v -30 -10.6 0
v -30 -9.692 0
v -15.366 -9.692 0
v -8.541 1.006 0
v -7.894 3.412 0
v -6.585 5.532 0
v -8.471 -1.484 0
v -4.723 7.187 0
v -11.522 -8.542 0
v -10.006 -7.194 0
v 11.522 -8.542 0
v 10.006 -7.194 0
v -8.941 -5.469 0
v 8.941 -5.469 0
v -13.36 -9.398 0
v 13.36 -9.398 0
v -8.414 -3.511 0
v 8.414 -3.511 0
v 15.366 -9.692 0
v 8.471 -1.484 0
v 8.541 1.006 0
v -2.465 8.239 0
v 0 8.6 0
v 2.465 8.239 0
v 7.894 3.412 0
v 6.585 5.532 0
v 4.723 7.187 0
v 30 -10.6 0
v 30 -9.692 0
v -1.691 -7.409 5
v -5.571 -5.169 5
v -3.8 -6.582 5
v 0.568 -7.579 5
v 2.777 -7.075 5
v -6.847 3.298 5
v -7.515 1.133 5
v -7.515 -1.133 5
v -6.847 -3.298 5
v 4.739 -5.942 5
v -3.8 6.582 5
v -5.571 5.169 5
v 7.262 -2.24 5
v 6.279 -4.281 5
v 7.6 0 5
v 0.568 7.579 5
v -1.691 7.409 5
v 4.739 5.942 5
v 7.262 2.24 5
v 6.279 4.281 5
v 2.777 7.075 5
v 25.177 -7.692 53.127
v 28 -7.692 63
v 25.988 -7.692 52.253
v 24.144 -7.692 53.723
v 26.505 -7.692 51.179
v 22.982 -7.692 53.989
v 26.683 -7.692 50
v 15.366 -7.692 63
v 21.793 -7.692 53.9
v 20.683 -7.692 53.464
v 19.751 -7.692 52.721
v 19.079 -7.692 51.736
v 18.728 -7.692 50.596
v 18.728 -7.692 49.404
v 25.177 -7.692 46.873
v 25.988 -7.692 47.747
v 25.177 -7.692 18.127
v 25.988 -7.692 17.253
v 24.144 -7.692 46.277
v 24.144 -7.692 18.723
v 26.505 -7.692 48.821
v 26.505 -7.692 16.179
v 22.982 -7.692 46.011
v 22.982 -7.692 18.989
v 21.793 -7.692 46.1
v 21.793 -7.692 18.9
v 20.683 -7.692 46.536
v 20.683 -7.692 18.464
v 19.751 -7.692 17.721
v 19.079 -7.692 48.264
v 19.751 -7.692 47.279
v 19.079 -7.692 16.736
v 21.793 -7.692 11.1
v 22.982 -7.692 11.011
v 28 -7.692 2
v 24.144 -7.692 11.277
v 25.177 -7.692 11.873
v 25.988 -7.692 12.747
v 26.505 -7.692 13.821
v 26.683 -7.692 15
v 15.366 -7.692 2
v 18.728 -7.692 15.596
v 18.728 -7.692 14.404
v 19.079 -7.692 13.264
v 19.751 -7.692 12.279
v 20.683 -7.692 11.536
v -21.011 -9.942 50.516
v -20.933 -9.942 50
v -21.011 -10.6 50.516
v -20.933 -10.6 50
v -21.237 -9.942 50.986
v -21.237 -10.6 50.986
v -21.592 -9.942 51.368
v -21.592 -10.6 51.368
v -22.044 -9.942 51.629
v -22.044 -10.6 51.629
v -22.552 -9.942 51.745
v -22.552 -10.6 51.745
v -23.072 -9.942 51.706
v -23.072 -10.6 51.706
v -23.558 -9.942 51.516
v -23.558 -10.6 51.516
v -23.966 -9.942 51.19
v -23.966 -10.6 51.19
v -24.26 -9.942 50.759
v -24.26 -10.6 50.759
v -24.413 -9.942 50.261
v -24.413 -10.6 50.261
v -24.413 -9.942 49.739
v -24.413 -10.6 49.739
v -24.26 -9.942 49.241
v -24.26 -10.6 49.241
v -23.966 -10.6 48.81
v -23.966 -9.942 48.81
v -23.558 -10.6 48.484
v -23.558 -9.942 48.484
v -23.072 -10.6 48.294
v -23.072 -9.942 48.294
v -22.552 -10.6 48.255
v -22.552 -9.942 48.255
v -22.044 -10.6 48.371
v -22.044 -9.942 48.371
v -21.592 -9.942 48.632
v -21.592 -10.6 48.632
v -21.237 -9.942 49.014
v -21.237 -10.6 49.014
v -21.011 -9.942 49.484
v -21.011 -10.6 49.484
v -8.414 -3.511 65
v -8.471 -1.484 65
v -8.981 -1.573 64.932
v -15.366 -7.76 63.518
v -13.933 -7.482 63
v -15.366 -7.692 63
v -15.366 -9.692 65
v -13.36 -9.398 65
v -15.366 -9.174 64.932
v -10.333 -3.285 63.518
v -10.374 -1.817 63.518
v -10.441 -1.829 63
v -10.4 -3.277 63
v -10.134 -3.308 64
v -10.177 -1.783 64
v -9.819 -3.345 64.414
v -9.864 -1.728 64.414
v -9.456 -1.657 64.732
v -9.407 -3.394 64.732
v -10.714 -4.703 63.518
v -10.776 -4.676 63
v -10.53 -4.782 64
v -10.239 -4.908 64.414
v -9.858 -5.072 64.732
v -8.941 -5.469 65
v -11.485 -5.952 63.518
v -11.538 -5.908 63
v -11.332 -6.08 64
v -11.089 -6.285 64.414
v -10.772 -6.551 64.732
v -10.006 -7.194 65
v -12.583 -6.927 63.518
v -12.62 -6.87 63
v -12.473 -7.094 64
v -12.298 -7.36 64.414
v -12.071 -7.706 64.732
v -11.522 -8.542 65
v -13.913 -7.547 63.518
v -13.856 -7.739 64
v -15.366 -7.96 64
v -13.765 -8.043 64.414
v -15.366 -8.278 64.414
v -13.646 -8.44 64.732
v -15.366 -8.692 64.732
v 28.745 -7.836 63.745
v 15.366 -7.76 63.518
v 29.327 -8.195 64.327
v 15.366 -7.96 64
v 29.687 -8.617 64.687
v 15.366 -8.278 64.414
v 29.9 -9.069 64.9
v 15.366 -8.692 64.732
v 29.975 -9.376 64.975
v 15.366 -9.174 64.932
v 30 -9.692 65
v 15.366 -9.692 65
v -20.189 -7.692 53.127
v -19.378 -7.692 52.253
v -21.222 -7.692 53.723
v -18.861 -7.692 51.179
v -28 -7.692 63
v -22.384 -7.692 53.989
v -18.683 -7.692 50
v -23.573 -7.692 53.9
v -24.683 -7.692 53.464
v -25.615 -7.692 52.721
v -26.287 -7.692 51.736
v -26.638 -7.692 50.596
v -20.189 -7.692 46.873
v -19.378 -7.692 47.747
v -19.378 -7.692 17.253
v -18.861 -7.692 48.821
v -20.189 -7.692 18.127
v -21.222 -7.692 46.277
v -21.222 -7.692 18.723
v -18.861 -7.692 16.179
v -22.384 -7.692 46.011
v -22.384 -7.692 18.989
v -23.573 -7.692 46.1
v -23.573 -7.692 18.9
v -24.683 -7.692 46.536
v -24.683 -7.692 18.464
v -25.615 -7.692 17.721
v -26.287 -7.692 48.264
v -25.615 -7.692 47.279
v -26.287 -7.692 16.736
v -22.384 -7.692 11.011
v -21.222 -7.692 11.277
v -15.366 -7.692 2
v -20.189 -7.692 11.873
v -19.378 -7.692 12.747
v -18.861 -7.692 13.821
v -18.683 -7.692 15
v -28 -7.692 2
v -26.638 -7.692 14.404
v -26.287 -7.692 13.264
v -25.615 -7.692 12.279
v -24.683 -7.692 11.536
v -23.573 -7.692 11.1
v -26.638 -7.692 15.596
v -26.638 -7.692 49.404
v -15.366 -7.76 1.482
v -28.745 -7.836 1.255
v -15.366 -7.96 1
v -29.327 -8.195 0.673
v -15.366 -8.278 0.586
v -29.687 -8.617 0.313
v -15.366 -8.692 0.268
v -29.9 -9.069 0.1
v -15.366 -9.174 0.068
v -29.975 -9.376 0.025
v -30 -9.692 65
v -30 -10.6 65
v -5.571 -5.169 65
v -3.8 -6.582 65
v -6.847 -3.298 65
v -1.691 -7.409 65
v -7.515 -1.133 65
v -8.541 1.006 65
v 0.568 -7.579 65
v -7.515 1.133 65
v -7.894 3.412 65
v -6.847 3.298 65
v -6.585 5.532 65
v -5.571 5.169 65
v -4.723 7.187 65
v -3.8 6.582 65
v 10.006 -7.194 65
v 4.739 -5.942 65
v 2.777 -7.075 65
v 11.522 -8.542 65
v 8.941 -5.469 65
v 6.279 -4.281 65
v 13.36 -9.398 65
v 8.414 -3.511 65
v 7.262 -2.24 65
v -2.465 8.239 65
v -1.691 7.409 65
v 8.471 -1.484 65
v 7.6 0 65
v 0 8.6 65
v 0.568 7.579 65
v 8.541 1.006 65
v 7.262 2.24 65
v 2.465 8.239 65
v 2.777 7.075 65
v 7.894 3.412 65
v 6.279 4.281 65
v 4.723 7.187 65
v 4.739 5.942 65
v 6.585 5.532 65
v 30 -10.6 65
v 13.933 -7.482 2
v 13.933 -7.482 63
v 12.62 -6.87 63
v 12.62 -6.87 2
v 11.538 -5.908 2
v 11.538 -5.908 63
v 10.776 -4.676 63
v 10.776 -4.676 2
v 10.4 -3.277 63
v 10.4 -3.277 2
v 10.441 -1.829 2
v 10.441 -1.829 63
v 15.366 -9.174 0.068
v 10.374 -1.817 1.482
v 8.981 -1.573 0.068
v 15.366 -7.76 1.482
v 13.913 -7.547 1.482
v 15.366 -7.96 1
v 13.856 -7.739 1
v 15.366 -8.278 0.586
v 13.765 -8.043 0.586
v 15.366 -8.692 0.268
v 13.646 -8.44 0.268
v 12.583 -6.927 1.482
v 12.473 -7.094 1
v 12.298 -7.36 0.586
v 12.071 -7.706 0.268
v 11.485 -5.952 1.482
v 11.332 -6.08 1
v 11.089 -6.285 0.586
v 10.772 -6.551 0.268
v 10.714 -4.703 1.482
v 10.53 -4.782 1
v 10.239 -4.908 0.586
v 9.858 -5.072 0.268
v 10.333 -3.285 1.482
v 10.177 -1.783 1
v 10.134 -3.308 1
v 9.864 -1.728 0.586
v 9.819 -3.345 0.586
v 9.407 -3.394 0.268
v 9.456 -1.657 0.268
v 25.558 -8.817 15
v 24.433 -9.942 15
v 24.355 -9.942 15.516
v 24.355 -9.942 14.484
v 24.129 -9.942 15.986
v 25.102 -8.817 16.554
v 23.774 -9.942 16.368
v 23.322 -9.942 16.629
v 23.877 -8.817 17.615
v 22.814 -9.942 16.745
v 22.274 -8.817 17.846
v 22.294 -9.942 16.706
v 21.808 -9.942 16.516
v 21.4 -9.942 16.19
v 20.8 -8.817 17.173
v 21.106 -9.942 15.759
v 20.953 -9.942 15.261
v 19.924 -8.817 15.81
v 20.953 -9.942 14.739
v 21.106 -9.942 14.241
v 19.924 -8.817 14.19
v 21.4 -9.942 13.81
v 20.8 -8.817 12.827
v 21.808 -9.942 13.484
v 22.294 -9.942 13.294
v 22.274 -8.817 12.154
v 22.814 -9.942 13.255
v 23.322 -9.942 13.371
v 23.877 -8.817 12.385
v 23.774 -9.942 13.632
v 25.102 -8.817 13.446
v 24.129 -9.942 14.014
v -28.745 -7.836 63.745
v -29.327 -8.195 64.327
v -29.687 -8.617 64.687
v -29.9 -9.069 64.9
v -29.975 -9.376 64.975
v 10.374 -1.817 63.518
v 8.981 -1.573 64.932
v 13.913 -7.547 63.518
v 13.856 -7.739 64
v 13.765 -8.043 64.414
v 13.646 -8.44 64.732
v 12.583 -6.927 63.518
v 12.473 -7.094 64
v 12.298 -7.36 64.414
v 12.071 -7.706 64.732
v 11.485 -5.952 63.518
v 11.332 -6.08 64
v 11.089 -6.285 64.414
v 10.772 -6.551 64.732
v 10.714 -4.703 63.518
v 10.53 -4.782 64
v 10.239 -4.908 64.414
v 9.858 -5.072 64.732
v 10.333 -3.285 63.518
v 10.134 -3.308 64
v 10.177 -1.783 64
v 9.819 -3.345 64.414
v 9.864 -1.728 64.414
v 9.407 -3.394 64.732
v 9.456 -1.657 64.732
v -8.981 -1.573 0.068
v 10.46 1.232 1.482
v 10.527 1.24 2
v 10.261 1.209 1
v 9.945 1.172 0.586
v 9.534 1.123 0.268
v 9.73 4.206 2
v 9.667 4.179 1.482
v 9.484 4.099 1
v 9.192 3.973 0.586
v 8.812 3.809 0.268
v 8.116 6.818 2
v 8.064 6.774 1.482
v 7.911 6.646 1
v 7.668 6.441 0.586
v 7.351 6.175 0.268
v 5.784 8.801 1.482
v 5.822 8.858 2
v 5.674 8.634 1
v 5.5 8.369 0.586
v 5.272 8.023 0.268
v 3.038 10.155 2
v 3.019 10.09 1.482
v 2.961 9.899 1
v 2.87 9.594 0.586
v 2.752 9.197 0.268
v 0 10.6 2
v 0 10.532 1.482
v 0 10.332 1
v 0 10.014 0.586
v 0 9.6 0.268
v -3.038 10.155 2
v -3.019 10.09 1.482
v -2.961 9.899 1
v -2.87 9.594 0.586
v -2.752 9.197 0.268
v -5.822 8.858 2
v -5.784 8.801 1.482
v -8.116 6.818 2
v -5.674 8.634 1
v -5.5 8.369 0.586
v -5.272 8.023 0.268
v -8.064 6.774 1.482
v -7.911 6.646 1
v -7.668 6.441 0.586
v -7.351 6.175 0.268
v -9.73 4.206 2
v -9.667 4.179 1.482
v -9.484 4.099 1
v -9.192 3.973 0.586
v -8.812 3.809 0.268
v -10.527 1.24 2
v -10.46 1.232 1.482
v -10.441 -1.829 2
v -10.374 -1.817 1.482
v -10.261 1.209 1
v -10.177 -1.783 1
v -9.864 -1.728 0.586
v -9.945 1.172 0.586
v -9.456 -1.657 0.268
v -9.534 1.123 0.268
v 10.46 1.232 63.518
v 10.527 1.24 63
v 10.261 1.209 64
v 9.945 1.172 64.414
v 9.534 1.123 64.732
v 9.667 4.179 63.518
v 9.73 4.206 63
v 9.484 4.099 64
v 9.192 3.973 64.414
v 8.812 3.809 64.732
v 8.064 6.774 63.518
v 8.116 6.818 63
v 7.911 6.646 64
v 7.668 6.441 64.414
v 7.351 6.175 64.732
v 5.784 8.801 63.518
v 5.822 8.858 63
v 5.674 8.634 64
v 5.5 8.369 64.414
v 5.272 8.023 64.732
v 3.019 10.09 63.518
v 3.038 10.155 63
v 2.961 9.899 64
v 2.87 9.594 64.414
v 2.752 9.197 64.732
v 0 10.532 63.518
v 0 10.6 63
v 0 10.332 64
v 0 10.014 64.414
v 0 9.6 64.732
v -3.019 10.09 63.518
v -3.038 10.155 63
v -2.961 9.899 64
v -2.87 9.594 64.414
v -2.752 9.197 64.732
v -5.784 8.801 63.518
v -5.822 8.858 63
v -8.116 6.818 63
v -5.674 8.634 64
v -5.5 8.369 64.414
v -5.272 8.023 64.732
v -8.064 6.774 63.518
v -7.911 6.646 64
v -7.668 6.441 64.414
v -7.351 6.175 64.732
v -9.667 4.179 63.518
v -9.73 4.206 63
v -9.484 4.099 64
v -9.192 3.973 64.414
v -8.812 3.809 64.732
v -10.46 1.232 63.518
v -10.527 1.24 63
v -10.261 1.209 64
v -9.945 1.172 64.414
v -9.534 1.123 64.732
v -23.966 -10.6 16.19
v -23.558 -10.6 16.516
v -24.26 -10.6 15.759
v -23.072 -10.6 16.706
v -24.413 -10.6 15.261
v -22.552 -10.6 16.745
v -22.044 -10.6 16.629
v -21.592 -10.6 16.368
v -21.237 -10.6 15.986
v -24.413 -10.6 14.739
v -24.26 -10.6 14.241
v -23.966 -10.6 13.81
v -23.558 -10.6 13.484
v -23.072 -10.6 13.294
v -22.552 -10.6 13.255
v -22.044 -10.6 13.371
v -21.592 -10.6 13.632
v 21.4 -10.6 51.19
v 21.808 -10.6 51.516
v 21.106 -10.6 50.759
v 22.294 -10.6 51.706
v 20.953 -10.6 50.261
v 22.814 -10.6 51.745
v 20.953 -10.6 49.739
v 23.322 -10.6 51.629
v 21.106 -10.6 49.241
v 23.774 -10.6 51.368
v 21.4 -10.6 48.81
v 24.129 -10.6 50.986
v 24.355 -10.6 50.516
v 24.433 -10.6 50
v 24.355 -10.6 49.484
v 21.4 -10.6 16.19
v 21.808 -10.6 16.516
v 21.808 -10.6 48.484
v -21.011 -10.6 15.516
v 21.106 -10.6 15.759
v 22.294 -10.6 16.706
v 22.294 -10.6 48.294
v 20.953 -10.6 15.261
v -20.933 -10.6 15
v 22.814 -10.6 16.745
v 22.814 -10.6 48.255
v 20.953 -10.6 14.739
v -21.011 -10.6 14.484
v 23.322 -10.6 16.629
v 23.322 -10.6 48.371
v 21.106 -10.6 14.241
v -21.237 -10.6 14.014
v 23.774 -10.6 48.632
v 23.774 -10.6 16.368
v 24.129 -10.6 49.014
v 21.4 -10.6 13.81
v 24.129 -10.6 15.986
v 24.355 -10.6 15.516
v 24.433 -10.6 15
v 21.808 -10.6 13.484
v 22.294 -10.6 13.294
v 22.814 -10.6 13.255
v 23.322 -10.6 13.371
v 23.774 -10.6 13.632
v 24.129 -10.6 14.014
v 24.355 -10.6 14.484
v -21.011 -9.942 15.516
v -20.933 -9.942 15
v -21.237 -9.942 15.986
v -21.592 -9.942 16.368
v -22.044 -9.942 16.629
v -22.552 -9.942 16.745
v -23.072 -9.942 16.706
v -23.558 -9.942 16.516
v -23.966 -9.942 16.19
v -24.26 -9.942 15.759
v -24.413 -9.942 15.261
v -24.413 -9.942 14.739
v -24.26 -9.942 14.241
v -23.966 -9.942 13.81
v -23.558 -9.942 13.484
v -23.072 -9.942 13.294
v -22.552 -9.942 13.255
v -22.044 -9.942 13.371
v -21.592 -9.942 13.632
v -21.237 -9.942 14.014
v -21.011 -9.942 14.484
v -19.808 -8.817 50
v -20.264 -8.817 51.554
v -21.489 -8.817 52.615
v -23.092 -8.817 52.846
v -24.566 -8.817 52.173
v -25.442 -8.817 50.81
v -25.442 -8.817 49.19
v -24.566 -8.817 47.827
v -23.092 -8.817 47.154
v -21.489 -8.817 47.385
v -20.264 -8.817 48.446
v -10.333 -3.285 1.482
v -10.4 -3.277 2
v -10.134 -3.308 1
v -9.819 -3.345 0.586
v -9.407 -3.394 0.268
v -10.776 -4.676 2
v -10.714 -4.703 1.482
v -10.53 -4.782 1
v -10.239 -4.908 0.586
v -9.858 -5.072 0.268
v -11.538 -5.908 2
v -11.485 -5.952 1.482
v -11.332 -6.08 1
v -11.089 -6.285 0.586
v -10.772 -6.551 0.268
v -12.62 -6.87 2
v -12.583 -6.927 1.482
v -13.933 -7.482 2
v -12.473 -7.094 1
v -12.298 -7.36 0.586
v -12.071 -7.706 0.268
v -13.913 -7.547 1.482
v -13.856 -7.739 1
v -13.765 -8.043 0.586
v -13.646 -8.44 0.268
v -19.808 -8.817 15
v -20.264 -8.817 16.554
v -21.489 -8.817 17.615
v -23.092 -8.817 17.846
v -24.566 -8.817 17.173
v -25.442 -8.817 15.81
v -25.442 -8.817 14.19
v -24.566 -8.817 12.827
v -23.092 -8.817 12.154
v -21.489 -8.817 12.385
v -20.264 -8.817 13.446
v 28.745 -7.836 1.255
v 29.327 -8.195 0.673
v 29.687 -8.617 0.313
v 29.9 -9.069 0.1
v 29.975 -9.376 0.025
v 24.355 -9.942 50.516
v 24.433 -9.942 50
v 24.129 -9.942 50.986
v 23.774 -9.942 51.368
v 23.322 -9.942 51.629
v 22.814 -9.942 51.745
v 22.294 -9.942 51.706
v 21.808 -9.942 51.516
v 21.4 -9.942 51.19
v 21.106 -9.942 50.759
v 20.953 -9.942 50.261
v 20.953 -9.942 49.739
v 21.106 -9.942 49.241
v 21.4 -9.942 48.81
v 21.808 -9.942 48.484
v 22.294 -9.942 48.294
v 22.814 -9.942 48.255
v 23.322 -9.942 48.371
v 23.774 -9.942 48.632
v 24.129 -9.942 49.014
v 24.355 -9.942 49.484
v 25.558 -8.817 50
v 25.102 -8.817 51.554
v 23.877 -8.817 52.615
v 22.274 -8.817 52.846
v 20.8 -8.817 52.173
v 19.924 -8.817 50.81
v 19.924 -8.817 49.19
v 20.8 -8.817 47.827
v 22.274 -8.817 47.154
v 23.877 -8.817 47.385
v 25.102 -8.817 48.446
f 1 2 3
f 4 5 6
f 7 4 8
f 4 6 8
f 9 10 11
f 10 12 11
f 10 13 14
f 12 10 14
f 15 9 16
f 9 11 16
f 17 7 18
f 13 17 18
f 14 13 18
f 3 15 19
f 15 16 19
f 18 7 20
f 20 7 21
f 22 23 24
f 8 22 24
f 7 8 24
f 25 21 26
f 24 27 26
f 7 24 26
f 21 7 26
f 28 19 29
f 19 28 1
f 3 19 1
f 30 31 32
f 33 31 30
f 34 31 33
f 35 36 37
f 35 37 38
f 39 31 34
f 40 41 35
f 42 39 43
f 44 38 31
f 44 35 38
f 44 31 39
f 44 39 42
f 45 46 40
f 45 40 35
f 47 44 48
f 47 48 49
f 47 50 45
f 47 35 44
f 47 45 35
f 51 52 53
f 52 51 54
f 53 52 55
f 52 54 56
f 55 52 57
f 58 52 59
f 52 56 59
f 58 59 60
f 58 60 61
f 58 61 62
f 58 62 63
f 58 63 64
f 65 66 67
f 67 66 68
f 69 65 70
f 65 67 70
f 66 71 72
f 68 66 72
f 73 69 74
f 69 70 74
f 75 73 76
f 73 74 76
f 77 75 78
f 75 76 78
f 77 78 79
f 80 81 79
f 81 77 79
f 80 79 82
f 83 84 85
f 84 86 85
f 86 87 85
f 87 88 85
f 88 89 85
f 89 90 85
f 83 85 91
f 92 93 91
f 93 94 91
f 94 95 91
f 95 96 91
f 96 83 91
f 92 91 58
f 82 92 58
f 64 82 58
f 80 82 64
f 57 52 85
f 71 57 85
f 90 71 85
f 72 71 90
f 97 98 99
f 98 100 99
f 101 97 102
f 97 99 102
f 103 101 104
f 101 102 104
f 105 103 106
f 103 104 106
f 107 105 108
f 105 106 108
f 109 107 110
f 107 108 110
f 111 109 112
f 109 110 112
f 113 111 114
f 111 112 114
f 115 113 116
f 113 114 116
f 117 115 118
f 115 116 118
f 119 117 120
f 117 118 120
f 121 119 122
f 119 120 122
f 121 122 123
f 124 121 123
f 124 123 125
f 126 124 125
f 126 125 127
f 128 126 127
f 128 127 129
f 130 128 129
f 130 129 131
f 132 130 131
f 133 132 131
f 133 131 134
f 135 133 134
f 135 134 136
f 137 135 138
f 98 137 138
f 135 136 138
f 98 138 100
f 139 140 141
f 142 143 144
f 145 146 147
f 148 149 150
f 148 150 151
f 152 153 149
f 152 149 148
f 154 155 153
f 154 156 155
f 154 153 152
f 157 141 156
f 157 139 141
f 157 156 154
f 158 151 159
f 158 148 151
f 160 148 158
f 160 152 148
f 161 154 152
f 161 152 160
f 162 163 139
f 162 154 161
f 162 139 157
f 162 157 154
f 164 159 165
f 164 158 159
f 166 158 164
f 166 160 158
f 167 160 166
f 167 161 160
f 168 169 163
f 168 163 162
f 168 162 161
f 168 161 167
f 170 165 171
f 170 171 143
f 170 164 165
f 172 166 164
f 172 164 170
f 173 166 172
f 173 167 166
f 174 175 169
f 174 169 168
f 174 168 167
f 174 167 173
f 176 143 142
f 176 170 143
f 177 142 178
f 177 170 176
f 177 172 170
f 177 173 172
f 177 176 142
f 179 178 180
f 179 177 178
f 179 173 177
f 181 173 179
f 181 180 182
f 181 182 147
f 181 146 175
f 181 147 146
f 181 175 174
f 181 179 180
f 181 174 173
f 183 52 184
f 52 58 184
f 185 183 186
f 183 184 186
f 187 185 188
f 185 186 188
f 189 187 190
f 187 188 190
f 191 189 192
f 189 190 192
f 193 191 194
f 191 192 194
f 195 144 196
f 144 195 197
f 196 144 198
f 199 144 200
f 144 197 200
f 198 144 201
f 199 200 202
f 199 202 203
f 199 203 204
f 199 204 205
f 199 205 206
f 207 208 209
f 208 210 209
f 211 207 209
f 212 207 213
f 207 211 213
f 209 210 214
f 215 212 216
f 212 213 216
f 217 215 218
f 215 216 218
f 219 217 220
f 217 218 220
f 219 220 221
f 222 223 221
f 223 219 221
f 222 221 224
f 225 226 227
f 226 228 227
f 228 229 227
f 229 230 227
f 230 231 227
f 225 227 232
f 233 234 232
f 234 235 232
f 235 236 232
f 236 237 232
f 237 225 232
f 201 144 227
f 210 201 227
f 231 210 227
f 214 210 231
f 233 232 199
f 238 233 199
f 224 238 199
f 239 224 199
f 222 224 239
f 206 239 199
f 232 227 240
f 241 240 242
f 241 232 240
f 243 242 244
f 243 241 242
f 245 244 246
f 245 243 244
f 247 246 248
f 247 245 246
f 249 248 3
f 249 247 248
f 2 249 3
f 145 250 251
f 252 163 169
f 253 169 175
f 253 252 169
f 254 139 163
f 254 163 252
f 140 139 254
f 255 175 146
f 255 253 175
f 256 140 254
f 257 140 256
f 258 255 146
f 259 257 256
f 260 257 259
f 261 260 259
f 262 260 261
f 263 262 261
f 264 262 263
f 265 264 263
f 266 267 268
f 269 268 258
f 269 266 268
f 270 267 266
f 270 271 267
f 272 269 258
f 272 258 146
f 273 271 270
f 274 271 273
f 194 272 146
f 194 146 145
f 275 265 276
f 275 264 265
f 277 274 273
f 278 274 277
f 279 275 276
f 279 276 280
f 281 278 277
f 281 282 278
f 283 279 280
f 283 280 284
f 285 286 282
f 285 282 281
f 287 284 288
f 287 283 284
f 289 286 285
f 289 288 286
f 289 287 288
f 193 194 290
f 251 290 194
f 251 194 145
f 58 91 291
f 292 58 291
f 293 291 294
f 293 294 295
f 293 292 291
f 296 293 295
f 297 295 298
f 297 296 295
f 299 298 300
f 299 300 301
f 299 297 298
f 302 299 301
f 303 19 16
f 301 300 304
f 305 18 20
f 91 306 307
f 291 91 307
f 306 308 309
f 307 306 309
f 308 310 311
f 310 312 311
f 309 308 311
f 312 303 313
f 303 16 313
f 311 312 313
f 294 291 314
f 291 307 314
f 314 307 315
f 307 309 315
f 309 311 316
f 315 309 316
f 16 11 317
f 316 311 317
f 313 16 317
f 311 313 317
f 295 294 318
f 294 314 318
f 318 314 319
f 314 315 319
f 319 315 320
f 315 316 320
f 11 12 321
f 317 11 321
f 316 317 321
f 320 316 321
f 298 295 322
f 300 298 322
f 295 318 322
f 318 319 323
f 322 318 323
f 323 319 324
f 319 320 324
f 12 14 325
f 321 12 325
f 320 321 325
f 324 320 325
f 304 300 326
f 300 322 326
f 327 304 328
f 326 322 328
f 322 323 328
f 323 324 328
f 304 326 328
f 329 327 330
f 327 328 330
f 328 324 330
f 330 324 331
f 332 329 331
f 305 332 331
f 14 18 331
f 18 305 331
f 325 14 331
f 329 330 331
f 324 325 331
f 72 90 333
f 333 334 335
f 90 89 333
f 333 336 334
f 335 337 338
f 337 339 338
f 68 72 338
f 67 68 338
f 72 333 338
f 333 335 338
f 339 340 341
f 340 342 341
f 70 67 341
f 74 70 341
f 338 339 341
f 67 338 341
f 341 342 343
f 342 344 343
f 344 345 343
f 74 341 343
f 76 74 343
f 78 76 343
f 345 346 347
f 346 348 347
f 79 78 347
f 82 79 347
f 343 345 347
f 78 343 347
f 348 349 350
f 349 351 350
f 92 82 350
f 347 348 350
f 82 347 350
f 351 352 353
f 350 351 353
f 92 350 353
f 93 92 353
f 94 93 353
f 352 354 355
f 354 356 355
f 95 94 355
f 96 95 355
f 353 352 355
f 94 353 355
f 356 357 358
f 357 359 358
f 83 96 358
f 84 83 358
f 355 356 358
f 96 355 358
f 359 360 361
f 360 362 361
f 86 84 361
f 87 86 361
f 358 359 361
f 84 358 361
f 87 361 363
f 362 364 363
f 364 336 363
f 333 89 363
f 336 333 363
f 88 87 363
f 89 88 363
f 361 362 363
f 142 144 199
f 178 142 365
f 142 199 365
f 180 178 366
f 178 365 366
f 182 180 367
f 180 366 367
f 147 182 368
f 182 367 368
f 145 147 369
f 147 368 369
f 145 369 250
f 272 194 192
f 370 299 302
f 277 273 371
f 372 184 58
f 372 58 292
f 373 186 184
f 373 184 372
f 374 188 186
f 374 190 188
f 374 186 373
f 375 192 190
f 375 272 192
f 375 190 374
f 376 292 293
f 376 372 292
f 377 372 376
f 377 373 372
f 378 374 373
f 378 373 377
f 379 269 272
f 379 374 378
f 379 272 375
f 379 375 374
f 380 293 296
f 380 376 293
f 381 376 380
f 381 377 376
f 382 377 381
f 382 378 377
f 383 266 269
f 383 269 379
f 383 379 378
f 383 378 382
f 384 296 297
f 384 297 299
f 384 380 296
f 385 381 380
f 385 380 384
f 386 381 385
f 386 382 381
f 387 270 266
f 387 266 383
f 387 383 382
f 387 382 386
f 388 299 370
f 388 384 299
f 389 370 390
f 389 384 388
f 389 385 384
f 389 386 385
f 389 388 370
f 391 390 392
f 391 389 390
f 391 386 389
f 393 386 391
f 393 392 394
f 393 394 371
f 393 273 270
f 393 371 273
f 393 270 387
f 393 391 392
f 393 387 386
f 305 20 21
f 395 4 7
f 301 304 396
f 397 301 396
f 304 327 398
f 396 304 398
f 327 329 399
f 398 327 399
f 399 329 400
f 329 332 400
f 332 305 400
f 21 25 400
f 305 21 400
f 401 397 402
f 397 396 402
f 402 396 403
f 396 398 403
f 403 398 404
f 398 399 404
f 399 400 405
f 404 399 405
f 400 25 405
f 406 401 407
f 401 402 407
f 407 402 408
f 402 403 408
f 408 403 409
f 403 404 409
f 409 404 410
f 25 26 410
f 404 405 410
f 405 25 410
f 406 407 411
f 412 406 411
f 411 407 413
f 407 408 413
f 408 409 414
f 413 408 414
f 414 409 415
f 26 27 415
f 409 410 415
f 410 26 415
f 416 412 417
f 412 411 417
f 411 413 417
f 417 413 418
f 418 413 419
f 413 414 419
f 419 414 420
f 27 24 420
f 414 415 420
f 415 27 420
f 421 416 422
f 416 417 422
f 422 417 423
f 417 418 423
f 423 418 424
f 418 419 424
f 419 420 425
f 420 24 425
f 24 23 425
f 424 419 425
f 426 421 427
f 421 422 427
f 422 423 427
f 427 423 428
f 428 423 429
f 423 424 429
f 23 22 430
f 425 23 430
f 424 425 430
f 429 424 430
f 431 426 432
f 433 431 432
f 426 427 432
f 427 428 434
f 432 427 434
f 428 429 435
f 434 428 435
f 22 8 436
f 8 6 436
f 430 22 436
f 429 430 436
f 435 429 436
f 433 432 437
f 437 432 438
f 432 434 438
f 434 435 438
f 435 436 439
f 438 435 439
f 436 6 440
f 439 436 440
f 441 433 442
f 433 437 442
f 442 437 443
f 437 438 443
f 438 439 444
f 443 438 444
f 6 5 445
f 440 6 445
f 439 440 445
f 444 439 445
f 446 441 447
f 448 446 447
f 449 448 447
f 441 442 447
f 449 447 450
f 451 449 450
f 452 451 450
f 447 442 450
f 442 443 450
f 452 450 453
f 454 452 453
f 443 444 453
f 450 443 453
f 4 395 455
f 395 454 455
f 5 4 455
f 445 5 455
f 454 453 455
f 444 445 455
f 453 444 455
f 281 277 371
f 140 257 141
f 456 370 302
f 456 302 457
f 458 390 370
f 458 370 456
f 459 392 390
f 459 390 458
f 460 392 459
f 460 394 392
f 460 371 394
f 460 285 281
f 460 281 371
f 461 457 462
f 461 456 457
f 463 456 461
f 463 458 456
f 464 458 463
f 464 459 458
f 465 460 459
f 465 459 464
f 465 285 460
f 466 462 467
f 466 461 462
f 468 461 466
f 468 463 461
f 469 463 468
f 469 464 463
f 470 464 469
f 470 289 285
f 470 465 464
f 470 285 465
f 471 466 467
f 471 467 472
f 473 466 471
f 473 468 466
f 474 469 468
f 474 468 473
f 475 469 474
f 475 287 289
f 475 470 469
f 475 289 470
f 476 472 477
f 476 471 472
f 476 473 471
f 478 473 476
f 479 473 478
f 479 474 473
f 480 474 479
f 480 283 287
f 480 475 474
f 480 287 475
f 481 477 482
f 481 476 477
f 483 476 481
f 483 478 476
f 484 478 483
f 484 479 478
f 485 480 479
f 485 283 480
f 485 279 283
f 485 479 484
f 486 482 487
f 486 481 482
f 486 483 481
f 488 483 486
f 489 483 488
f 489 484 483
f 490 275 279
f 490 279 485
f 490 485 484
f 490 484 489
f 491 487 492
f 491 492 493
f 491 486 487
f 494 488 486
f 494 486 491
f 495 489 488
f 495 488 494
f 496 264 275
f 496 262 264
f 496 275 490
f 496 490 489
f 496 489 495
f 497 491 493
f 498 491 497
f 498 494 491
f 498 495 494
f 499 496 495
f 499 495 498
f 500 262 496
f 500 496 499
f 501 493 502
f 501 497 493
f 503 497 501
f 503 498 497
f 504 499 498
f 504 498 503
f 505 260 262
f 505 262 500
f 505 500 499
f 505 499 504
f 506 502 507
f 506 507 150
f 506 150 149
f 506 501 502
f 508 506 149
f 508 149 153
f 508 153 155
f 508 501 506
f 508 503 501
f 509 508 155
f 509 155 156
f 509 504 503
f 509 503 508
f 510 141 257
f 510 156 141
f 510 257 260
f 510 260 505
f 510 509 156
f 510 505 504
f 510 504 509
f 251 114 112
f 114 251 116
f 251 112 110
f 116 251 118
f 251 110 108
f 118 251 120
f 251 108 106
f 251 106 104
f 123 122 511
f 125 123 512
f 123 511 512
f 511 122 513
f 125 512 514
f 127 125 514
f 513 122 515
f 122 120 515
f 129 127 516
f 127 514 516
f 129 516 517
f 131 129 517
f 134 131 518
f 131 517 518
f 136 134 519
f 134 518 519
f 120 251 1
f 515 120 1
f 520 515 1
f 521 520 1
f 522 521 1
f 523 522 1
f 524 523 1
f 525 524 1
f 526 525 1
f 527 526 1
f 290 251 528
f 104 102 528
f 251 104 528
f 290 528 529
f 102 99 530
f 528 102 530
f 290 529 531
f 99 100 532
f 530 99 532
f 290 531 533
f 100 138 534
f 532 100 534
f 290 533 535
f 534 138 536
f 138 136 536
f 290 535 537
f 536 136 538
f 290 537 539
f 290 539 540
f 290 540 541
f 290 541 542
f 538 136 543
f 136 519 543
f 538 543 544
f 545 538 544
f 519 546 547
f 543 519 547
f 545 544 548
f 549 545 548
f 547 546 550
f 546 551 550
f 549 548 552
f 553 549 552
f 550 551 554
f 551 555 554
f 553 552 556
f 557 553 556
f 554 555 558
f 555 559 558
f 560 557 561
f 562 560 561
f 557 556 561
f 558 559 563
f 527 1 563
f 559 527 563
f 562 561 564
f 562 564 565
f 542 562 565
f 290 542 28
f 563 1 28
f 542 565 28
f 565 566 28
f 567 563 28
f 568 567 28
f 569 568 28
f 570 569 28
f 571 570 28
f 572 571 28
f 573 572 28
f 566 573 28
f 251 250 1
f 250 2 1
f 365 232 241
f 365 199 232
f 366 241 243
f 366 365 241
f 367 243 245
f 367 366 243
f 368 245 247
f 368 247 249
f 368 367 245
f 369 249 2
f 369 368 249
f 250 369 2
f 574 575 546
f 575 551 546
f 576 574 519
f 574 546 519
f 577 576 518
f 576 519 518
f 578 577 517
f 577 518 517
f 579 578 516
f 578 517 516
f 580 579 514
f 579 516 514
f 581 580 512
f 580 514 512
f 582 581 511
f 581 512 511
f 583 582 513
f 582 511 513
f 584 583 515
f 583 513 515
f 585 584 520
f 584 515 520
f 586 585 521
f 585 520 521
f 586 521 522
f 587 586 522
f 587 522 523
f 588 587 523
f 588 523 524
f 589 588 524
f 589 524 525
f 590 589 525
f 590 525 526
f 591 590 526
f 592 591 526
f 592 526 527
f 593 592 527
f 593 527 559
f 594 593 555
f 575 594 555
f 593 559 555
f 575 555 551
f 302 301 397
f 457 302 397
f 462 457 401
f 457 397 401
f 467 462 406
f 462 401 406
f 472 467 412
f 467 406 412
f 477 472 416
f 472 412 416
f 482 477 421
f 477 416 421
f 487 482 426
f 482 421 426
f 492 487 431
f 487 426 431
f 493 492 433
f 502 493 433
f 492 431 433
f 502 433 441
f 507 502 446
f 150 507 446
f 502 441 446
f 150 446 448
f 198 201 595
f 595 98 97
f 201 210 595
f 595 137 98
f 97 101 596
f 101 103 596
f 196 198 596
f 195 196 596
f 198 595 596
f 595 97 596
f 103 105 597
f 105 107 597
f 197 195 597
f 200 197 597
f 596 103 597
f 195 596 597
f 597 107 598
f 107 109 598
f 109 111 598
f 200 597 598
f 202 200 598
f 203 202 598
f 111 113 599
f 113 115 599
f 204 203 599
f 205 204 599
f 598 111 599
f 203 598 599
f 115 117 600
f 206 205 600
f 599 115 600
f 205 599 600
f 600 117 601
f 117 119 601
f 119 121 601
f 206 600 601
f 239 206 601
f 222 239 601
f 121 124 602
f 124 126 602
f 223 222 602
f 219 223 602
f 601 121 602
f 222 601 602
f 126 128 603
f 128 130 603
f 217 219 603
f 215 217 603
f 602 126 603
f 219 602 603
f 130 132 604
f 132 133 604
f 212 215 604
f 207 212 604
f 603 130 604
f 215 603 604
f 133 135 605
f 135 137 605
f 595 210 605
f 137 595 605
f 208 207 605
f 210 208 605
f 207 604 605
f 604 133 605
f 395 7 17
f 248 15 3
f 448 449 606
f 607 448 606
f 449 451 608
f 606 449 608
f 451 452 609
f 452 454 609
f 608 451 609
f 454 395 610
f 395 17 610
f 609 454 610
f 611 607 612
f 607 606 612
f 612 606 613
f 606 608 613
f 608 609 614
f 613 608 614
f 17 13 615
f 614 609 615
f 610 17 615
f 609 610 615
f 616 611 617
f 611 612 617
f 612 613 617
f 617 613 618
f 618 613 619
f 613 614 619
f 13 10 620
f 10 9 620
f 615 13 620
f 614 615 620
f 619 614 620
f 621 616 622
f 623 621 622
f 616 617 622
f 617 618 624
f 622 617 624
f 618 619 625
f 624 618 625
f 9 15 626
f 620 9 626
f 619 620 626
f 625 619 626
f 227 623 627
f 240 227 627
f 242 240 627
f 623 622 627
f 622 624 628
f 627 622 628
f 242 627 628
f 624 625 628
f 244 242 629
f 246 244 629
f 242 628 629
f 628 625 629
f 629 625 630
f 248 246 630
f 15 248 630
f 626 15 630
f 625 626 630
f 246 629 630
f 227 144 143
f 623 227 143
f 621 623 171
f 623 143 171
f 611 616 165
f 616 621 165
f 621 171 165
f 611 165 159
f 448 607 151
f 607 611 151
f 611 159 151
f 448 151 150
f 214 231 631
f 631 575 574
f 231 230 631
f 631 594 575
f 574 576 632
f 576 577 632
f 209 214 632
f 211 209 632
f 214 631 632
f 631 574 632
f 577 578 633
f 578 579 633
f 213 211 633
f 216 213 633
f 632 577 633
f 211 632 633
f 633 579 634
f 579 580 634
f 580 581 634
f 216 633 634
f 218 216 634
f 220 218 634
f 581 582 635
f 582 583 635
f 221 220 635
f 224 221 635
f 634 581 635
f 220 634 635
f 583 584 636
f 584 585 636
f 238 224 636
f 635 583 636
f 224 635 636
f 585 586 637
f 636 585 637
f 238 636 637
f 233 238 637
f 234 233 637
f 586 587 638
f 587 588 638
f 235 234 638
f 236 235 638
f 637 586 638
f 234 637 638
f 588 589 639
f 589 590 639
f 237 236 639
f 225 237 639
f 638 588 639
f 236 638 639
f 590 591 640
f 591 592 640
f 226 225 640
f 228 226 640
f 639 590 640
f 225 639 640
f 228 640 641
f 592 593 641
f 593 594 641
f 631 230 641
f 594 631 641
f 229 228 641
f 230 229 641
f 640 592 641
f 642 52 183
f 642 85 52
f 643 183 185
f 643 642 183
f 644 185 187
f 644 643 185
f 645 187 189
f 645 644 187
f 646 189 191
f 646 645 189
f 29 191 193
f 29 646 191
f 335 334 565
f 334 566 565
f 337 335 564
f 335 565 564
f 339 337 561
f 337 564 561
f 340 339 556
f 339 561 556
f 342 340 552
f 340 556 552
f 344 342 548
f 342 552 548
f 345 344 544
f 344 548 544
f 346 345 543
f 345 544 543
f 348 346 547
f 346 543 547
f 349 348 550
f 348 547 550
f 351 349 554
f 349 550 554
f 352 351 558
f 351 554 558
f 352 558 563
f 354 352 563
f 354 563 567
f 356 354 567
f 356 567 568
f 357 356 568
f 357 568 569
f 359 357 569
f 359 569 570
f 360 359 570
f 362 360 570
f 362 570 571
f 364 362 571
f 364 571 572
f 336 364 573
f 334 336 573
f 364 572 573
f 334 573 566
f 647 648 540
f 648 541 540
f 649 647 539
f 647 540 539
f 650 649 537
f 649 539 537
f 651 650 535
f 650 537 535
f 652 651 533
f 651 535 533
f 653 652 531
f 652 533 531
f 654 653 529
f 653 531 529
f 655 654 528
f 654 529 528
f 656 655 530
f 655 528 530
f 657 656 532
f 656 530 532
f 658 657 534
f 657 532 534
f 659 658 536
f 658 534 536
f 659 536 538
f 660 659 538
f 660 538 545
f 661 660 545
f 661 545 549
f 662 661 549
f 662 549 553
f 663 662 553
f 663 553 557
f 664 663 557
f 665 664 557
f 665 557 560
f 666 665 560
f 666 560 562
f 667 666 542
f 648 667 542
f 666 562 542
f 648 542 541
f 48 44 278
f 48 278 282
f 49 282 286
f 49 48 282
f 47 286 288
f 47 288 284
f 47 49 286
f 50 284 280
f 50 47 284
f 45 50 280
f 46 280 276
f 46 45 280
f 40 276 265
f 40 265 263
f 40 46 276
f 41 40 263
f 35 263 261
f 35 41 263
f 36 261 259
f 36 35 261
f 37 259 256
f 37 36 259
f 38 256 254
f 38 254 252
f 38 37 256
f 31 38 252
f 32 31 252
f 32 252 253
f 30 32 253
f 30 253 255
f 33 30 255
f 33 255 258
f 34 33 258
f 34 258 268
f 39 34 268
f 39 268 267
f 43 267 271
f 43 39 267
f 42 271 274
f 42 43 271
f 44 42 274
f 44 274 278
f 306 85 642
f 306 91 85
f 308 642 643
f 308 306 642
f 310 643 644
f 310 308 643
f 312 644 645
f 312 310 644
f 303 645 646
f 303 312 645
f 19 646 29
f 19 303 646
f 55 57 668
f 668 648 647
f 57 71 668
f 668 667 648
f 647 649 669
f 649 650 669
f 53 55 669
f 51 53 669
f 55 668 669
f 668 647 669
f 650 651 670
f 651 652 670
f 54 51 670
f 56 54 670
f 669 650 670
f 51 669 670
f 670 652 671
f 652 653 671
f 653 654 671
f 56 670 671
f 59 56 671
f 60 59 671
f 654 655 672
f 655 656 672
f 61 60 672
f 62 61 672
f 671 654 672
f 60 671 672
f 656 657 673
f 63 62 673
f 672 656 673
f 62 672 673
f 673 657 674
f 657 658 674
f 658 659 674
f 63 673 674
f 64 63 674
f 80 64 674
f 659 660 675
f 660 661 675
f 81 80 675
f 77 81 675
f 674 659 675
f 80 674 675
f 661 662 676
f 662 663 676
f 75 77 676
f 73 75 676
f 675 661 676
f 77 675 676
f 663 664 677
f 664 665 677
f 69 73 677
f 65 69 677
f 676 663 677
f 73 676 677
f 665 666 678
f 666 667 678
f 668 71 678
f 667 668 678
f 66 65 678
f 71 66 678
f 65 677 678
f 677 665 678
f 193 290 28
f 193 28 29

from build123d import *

# Parameters (mm, degrees)
F0_R           = 7.6
F1_DEPTH       = 5
F2_R           = 7.6
F3_DEPTH       = 60
F4_R           = 5
F6_D           = 3.5
F6_CSINK_D     = 8
F6_CSINK_ANGLE = 90
F7_R           = 2


with BuildPart() as f1:
    # F0 (on Top) → F1 (new body)
    with BuildSketch(Plane.XY):
        with BuildLine():
            Line((30, -7.691861), (7.293509, -7.691861))
            ThreePointArc((7.293509, -7.691861), (0, 10.6), (-7.293509, -7.691861))
            Line((-7.293509, -7.691861), (-30, -7.691861))
            Line((-30, -7.691861), (-30, -10.6))
            Line((-30, -10.6), (0, -10.6))
            Line((0, -10.6), (30, -10.6))
            Line((30, -10.6), (30, -7.691861))
        make_face()
        Circle(F0_R, mode=Mode.SUBTRACT)
        Circle(F0_R)
    extrude(amount=F1_DEPTH)

    # F2 (on face) → F3 (join)
    with BuildSketch(Plane.XY.offset(5)):
        with BuildLine():
            Line((30, -7.691861), (7.293509, -7.691861))
            ThreePointArc((7.293509, -7.691861), (0, 10.6), (-7.293509, -7.691861))
            Line((-7.293509, -7.691861), (-30, -7.691861))
            Line((-30, -7.691861), (-30, -10.6))
            Line((-30, -10.6), (30, -10.6))
            Line((30, -10.6), (30, -7.691861))
        make_face()
        Circle(F2_R, mode=Mode.SUBTRACT)
    extrude(amount=F3_DEPTH)

    # F4
    f4_edges = [f1.edges().sort_by_distance(p)[0] for p in [
        (-7.293509, -7.691861, 32.5),
        (7.293509, -7.691861, 32.5),
    ]]
    fillet(f4_edges, radius=F4_R)

    # F6 (through all)
    with Locations(Plane(origin=(0, -7.691861, 0), x_dir=(-1, 0, 0), z_dir=(0, 1, 0))):
        with Locations((-22.682999, 50), (-22.682999, 15), (22.682999, 50), (22.682999, 15)):
            CounterSinkHole(F6_D / 2, F6_CSINK_D / 2, counter_sink_angle=F6_CSINK_ANGLE)

    # F7
    f7_edges = [f1.edges().sort_by_distance(p)[0] for p in [
        (0, 10.6, 65),
        (-30, -7.691861, 32.5),
        (30, -7.691861, 32.5),
        (22.682999, -7.691861, 0),
        (0, 10.6, 0),
    ]]
    fillet(f7_edges, radius=F7_R)


solid = f1.part
